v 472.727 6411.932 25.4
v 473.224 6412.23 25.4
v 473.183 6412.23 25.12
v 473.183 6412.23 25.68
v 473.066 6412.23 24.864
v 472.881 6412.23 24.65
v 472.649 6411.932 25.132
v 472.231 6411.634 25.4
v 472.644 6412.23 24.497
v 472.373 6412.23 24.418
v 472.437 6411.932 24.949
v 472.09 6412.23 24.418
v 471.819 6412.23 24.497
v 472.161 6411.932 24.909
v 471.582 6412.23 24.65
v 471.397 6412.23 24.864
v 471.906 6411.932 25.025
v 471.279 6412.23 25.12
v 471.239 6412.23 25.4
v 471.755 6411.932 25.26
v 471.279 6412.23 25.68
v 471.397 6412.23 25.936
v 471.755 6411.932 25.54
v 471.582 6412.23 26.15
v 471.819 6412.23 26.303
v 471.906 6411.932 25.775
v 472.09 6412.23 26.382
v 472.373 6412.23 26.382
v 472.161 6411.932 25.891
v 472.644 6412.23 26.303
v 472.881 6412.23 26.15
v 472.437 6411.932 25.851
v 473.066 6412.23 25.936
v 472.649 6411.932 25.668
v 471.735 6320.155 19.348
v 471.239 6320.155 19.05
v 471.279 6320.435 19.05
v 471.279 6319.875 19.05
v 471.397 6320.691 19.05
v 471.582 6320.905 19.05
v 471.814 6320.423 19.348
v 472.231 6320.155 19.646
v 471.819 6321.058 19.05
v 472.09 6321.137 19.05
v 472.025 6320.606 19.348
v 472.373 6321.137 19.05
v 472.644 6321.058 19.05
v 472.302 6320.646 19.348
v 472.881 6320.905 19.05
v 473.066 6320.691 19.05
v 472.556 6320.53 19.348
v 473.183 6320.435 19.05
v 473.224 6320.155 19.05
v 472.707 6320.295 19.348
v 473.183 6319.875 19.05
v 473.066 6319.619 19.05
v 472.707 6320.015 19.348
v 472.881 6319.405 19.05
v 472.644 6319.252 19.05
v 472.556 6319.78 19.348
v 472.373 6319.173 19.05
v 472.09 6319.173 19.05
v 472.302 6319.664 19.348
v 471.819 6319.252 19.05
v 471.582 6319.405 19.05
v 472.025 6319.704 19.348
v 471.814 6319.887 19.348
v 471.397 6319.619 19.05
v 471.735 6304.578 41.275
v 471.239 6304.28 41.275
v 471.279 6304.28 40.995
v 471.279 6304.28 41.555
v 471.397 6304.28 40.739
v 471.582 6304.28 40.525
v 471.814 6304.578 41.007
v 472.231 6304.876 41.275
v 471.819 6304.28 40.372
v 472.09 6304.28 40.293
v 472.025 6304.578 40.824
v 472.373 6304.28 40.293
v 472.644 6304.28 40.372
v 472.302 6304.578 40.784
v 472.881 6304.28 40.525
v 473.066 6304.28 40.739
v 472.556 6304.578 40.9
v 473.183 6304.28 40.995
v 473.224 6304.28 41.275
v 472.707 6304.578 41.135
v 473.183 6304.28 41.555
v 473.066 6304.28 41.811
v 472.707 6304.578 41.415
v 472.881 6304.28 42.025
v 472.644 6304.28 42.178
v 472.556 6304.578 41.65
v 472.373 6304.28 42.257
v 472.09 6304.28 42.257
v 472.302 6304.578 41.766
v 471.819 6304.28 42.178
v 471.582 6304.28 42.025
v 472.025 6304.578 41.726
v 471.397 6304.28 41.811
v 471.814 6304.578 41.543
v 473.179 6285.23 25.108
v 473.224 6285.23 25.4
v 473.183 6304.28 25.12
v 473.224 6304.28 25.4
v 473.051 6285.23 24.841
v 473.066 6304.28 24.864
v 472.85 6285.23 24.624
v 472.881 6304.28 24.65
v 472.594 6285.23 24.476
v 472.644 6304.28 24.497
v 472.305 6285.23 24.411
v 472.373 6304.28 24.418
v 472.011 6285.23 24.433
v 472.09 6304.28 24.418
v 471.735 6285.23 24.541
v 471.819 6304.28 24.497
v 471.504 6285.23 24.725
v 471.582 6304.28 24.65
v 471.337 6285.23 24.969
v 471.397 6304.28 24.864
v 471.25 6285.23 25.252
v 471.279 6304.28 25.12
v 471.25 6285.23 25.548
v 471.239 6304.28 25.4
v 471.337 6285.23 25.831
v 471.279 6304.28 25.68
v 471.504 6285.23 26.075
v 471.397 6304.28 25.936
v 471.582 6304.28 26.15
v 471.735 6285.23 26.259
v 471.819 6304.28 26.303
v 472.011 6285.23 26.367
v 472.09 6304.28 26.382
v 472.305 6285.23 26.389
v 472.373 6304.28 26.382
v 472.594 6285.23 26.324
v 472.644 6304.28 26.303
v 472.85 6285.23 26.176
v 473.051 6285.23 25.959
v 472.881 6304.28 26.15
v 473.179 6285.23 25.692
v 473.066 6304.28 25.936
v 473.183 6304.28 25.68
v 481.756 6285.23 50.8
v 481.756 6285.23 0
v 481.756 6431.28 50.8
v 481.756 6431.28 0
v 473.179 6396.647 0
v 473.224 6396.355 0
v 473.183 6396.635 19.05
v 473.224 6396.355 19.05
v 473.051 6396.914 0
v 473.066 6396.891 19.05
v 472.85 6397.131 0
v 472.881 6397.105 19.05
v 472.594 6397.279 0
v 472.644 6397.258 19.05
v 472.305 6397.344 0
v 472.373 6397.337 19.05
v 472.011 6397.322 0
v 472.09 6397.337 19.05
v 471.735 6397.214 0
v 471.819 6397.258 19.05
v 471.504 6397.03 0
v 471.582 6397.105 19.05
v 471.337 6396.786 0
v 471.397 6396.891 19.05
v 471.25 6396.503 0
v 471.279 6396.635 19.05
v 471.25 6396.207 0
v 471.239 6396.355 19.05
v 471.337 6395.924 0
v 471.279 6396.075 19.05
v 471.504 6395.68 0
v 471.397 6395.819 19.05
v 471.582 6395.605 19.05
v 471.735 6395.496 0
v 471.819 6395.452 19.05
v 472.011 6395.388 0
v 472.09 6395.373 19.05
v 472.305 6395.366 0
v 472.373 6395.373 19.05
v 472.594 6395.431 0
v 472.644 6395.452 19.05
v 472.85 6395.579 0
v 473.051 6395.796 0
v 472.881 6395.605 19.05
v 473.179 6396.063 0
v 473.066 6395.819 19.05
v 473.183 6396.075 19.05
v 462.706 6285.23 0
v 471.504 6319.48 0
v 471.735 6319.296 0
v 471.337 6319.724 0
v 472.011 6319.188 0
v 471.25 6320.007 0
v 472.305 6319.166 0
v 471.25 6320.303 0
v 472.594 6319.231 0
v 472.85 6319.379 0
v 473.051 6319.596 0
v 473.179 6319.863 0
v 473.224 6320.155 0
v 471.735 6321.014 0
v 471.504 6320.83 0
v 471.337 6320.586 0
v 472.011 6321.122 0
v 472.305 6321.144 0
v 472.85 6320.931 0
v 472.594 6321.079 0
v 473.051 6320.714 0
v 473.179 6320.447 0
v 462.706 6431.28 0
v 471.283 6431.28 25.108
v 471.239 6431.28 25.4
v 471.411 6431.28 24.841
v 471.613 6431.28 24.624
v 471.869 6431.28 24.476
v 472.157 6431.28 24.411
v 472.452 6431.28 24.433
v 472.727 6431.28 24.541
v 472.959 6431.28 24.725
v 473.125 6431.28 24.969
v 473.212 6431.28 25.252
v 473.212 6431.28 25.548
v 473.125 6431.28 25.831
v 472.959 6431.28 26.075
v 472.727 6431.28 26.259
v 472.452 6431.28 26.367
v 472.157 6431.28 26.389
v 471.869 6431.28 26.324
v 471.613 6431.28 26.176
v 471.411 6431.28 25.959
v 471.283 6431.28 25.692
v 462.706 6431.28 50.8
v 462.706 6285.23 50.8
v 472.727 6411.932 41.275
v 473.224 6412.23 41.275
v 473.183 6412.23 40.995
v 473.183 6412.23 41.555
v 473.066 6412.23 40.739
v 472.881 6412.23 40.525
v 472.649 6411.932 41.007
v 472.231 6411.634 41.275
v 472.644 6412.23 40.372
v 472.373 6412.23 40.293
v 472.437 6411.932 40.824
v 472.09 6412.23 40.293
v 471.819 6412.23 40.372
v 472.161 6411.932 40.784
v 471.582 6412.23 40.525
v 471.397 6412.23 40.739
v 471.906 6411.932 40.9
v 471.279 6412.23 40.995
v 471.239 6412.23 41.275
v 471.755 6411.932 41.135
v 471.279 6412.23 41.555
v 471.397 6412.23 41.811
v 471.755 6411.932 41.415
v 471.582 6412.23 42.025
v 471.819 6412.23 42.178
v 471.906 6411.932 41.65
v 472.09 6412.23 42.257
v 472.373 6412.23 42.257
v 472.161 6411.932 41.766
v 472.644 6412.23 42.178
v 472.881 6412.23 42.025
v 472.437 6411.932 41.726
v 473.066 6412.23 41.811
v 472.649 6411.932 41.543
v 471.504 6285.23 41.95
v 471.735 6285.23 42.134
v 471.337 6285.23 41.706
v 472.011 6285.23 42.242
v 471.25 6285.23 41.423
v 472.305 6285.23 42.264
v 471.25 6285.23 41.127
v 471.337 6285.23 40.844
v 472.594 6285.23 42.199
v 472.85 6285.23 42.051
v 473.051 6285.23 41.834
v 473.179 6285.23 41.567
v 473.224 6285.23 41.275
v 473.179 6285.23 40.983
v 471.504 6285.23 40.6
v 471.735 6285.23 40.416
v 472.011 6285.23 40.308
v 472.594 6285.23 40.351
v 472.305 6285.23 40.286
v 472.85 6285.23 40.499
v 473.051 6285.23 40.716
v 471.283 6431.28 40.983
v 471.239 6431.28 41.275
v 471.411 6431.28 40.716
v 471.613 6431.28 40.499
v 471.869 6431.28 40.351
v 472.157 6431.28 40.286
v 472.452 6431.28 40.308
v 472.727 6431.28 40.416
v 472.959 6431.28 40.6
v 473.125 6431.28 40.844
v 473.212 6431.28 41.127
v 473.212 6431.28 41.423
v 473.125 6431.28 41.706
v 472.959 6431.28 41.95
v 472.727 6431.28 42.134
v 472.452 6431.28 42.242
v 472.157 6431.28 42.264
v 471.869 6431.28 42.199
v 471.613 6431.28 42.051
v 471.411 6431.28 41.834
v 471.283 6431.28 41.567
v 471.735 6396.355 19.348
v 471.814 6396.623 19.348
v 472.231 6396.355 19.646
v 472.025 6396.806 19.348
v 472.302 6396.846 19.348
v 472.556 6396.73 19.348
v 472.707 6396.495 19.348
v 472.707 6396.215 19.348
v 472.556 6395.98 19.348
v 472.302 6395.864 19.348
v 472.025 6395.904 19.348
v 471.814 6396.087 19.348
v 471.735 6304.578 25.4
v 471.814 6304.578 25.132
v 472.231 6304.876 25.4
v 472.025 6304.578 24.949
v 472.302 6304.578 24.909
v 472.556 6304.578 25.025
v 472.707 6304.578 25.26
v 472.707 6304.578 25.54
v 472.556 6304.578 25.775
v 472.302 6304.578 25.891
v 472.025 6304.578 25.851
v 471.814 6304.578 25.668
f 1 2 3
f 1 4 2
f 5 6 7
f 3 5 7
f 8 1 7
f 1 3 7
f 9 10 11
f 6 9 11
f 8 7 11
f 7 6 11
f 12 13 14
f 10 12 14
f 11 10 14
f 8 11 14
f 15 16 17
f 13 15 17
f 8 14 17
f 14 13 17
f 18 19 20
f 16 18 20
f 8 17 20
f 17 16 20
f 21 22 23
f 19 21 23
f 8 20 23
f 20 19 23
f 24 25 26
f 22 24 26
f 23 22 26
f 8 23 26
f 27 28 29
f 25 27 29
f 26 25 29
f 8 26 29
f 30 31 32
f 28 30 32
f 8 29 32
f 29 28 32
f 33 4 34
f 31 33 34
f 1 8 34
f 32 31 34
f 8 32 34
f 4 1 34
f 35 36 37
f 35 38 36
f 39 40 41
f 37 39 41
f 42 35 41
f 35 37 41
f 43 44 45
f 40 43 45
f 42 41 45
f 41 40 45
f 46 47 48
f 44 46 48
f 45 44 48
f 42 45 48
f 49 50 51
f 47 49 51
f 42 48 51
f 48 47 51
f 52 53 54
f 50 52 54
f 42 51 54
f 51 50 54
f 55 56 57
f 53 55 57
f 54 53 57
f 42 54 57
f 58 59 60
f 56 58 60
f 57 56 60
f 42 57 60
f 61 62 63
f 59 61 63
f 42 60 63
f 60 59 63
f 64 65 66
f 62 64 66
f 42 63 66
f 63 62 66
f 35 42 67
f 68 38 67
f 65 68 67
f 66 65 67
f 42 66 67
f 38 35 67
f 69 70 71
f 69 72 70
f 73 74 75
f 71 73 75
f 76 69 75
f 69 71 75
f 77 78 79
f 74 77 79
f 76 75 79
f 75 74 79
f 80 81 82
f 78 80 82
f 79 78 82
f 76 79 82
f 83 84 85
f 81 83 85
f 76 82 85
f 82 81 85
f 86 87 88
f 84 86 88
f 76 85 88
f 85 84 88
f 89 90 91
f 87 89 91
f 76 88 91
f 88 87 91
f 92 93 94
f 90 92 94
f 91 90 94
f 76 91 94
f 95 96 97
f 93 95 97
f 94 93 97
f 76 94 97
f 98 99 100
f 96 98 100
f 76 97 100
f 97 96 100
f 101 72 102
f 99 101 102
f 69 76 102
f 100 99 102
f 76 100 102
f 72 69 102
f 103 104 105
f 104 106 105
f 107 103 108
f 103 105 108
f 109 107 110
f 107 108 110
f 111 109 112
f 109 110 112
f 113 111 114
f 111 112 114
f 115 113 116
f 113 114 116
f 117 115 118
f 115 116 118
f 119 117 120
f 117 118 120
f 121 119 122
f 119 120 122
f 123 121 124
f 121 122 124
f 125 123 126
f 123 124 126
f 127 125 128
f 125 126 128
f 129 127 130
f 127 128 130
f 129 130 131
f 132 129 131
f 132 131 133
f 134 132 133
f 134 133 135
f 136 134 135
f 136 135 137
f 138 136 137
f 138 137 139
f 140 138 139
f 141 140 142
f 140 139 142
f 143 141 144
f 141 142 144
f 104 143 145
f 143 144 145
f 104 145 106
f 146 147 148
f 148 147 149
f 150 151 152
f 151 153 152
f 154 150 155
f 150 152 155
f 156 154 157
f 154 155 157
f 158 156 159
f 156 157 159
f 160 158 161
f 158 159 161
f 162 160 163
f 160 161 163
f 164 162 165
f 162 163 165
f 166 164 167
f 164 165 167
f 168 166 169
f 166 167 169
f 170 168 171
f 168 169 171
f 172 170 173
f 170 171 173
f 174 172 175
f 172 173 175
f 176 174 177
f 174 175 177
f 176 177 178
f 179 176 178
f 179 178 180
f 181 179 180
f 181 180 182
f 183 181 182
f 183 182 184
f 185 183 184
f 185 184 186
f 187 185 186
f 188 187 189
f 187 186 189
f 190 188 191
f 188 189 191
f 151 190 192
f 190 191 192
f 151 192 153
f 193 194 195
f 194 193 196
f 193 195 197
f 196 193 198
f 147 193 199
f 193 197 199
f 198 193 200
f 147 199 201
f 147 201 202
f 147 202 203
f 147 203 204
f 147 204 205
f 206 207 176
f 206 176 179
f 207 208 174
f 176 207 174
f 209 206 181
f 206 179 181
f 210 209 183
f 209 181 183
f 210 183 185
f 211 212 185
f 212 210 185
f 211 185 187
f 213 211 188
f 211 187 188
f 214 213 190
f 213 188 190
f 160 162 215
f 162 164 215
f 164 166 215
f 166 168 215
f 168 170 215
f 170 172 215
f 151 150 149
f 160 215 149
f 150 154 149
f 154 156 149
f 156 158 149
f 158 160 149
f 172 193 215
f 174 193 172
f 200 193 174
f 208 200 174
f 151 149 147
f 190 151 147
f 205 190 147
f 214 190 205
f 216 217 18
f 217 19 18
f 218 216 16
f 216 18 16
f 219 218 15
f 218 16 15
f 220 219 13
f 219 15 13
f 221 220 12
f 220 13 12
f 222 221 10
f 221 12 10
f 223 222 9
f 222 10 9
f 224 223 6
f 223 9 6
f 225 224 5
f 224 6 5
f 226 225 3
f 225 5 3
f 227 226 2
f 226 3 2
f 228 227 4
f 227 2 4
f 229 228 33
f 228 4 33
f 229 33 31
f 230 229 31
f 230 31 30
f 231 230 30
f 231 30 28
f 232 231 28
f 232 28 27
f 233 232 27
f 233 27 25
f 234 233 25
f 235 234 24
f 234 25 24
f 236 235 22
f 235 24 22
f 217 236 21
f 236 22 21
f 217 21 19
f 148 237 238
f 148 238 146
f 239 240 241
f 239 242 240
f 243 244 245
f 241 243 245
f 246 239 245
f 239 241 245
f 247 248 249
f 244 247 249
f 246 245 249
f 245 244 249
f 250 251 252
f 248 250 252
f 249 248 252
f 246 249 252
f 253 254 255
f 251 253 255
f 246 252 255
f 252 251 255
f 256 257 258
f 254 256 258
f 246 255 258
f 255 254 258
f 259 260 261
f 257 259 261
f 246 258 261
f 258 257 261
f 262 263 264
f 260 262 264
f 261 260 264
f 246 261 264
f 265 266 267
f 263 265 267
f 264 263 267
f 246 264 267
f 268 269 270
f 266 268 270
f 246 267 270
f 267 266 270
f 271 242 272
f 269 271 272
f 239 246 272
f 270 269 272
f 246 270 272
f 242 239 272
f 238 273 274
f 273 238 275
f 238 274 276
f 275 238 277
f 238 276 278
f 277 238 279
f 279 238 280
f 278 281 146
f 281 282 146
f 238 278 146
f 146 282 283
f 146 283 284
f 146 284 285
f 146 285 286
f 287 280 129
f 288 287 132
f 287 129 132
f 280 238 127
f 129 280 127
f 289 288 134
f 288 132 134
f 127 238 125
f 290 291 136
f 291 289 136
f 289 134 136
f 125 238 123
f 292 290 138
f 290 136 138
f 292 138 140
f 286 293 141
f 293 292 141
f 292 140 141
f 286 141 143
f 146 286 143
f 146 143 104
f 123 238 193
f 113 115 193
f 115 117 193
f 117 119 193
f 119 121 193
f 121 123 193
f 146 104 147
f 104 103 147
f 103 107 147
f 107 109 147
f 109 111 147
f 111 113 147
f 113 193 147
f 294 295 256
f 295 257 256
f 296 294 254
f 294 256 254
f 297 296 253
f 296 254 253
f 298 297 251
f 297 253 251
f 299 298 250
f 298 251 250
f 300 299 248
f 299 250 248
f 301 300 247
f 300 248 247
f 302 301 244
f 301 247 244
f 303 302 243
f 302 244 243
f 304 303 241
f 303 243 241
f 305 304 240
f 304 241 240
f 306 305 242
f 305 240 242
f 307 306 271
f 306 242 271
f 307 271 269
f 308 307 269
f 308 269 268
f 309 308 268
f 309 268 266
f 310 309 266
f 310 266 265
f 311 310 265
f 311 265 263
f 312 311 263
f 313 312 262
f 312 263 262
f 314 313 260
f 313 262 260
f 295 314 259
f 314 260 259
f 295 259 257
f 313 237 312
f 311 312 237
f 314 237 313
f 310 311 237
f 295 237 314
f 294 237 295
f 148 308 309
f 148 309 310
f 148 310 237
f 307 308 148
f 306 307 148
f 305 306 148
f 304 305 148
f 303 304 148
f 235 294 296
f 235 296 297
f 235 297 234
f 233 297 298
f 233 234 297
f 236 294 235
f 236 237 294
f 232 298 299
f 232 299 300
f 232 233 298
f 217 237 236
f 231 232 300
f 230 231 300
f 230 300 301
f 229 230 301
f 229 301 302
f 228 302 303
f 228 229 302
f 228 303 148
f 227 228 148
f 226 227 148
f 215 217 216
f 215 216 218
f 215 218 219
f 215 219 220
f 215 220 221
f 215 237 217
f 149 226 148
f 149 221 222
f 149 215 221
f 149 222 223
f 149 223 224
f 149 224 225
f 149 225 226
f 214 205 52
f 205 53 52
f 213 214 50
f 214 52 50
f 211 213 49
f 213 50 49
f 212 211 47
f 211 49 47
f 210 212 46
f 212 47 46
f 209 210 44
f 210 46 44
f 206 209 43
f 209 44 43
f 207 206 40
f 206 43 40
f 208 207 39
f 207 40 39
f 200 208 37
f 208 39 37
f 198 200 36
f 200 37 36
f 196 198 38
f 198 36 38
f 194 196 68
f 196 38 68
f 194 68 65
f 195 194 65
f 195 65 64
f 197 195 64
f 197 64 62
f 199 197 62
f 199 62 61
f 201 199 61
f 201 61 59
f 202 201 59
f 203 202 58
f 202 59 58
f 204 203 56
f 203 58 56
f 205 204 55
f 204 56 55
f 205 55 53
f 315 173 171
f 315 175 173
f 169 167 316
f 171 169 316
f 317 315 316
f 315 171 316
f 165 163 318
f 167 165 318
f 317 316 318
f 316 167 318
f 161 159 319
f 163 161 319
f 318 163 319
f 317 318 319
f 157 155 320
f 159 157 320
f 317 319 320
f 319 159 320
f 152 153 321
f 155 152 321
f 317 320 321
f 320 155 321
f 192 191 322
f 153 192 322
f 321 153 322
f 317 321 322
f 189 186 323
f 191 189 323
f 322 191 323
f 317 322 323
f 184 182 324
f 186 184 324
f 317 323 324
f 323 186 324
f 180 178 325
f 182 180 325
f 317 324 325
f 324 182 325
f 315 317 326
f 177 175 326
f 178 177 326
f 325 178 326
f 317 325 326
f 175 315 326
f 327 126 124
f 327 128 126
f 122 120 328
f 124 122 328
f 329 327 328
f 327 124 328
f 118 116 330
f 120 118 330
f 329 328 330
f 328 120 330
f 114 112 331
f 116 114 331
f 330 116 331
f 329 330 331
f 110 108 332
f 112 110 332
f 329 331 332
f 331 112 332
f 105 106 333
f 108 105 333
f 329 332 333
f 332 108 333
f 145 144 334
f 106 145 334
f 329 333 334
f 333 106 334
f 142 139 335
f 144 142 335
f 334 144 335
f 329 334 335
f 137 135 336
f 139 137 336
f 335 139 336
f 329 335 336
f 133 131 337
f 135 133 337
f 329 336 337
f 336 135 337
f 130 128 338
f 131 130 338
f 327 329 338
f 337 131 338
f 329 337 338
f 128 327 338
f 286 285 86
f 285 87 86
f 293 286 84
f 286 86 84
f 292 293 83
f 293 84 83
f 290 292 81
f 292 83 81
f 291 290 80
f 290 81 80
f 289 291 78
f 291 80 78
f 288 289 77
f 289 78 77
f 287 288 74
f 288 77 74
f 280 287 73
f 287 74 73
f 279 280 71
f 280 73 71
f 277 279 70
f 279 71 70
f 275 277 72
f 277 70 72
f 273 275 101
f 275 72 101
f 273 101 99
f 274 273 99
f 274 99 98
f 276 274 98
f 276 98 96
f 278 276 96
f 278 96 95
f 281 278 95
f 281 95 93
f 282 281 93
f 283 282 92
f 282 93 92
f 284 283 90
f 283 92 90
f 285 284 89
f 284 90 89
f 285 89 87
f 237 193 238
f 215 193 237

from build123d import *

# Parameters (mm, degrees)
SKETCH1_W                           = 19.05
SKETCH1_H                           = 146.05
BOSS_EXTRUDE1_DEPTH                 = 50.8
F_5_64_0_07813_DIAMETER_HOLE1_D     = 1.984502
F_5_64_0_07813_DIAMETER_HOLE1_DEPTH = 38.1
F_5_64_0_07813_DIAMETER_HOLE1_TIP   = 0.59620455
F_5_64_0_07813_DIAMETER_HOLE2_D     = 1.984502
F_5_64_0_07813_DIAMETER_HOLE2_DEPTH = 38.1
F_5_64_0_07813_DIAMETER_HOLE2_TIP   = 0.59620455
F_5_64_0_07813_DIAMETER_HOLE3_D     = 1.984502
F_5_64_0_07813_DIAMETER_HOLE3_DEPTH = 19.05
F_5_64_0_07813_DIAMETER_HOLE3_TIP   = 0.59620455
F_5_64_0_07813_DIAMETER_HOLE4_D     = 1.984502
F_5_64_0_07813_DIAMETER_HOLE4_DEPTH = 19.05
F_5_64_0_07813_DIAMETER_HOLE4_TIP   = 0.59620455


with BuildPart() as part:
    # Sketch1 → Boss-Extrude1 (new body)
    with BuildSketch(Plane.XY):
        with Locations((472.231312422, 6358.255)):
            Rectangle(SKETCH1_W, SKETCH1_H)
    extrude(amount=BOSS_EXTRUDE1_DEPTH)

    # 5/64 (0.07813) Diameter Hole1
    with Locations(Plane(origin=(0, 1.6e-08, -19.050112211), x_dir=(-1, 0, 0), z_dir=(0, 1e-09, -1))):
        with Locations((-481.589248274, 6993.254992531), (-386.339248274, 6993.254992531), (-291.089248274, 6993.254992531), (-295.274999999, 6965.135938475), (-295.274999999, 6812.735938475), (-295.274999999, 6660.335938474), (-285.166362357, 6631.468843414), (-475.477307398, 6631.468752771), (-485.002307398, 6660.335938474), (-485.002307398, 6812.735938474), (-485.002307398, 6965.135938474), (-478.365617646, 6611.6708), (-287.865617646, 6611.6708), (-307.975, 6564.3379), (-307.975, 6488.1379), (-284.960913066, 6440.805), (-380.210913066, 6440.805), (-475.460913066, 6440.805), (-446.831312422, 6488.1379), (-446.831312422, 6564.3379), (-472.231312422, 6396.355), (-472.231312422, 6320.155), (-472.653156211, 6275.705000839), (-377.403156211, 6275.705000839), (-282.153156211, 6275.705000839), (-282.575, 6320.155), (-282.575, 6396.355), (-435.598646187, 6221.729999816), (-435.598646187, 6145.529999816), (-450.592518112, 6091.554999951), (-460.998646187, 6091.555478285), (-460.998646187, 6056.629999944), (-460.998646187, 5980.429999944), (-460.998646187, 5945.505000042), (-282.153156211, 5945.505000042), (-368.611823093, 5945.505000042)):
            Hole(F_5_64_0_07813_DIAMETER_HOLE1_D / 2, depth=F_5_64_0_07813_DIAMETER_HOLE1_DEPTH)
            with Locations((0, 0, -(F_5_64_0_07813_DIAMETER_HOLE1_DEPTH + F_5_64_0_07813_DIAMETER_HOLE1_TIP / 2))):  # 118° drill point
                Cone(0, F_5_64_0_07813_DIAMETER_HOLE1_D / 2, F_5_64_0_07813_DIAMETER_HOLE1_TIP, mode=Mode.SUBTRACT)

    # 5/64 (0.07813) Diameter Hole2
    with Locations(Plane(origin=(189.656312422, 1.6e-08, -19.050112211), x_dir=(-1, 0, 0), z_dir=(0, 1e-09, -1))):
        with Locations((-481.589248274, 6993.254992531), (-386.339248274, 6993.254992531), (-291.089248274, 6993.254992531), (-295.274999999, 6965.135938475), (-295.274999999, 6812.735938475), (-295.274999999, 6660.335938474), (-285.166362357, 6631.468843414), (-475.477307398, 6631.468752771), (-485.002307398, 6660.335938474), (-485.002307398, 6812.735938474), (-485.002307398, 6965.135938474), (-478.365617646, 6611.6708), (-287.865617646, 6611.6708), (-307.975, 6564.3379), (-307.975, 6488.1379), (-284.960913066, 6440.805), (-380.210913066, 6440.805), (-475.460913066, 6440.805), (-446.831312422, 6488.1379), (-446.831312422, 6564.3379), (-472.231312422, 6396.355), (-472.231312422, 6320.155), (-472.653156211, 6275.705000839), (-377.403156211, 6275.705000839), (-282.153156211, 6275.705000839), (-282.575, 6320.155), (-282.575, 6396.355), (-435.598646187, 6221.729999816), (-435.598646187, 6145.529999816), (-450.592518112, 6091.554999951), (-460.998646187, 6091.555478285), (-460.998646187, 6056.629999944), (-460.998646187, 5980.429999944), (-460.998646187, 5945.505000042), (-282.153156211, 5945.505000042), (-368.611823093, 5945.505000042)):
            Hole(F_5_64_0_07813_DIAMETER_HOLE2_D / 2, depth=F_5_64_0_07813_DIAMETER_HOLE2_DEPTH)
            with Locations((0, 0, -(F_5_64_0_07813_DIAMETER_HOLE2_DEPTH + F_5_64_0_07813_DIAMETER_HOLE2_TIP / 2))):  # 118° drill point
                Cone(0, F_5_64_0_07813_DIAMETER_HOLE2_D / 2, F_5_64_0_07813_DIAMETER_HOLE2_TIP, mode=Mode.SUBTRACT)

    # 5/64 (0.07813) Diameter Hole3
    with Locations(Plane(origin=(0, 6431.28, 0), x_dir=(1, 0, 0), z_dir=(0, 1, 0))):
        with Locations((472.231312422, -41.275), (472.231312422, -25.4)):
            Hole(F_5_64_0_07813_DIAMETER_HOLE3_D / 2, depth=F_5_64_0_07813_DIAMETER_HOLE3_DEPTH)
            with Locations((0, 0, -(F_5_64_0_07813_DIAMETER_HOLE3_DEPTH + F_5_64_0_07813_DIAMETER_HOLE3_TIP / 2))):  # 118° drill point
                Cone(0, F_5_64_0_07813_DIAMETER_HOLE3_D / 2, F_5_64_0_07813_DIAMETER_HOLE3_TIP, mode=Mode.SUBTRACT)

    # 5/64 (0.07813) Diameter Hole4
    with Locations(Plane(origin=(0, 6285.23, 0), x_dir=(-1, 0, 0), z_dir=(0, -1, 0))):
        with Locations((-472.231312422, -25.4), (-472.231312422, -41.275)):
            Hole(F_5_64_0_07813_DIAMETER_HOLE4_D / 2, depth=F_5_64_0_07813_DIAMETER_HOLE4_DEPTH)
            with Locations((0, 0, -(F_5_64_0_07813_DIAMETER_HOLE4_DEPTH + F_5_64_0_07813_DIAMETER_HOLE4_TIP / 2))):  # 118° drill point
                Cone(0, F_5_64_0_07813_DIAMETER_HOLE4_D / 2, F_5_64_0_07813_DIAMETER_HOLE4_TIP, mode=Mode.SUBTRACT)


solid = part.part
